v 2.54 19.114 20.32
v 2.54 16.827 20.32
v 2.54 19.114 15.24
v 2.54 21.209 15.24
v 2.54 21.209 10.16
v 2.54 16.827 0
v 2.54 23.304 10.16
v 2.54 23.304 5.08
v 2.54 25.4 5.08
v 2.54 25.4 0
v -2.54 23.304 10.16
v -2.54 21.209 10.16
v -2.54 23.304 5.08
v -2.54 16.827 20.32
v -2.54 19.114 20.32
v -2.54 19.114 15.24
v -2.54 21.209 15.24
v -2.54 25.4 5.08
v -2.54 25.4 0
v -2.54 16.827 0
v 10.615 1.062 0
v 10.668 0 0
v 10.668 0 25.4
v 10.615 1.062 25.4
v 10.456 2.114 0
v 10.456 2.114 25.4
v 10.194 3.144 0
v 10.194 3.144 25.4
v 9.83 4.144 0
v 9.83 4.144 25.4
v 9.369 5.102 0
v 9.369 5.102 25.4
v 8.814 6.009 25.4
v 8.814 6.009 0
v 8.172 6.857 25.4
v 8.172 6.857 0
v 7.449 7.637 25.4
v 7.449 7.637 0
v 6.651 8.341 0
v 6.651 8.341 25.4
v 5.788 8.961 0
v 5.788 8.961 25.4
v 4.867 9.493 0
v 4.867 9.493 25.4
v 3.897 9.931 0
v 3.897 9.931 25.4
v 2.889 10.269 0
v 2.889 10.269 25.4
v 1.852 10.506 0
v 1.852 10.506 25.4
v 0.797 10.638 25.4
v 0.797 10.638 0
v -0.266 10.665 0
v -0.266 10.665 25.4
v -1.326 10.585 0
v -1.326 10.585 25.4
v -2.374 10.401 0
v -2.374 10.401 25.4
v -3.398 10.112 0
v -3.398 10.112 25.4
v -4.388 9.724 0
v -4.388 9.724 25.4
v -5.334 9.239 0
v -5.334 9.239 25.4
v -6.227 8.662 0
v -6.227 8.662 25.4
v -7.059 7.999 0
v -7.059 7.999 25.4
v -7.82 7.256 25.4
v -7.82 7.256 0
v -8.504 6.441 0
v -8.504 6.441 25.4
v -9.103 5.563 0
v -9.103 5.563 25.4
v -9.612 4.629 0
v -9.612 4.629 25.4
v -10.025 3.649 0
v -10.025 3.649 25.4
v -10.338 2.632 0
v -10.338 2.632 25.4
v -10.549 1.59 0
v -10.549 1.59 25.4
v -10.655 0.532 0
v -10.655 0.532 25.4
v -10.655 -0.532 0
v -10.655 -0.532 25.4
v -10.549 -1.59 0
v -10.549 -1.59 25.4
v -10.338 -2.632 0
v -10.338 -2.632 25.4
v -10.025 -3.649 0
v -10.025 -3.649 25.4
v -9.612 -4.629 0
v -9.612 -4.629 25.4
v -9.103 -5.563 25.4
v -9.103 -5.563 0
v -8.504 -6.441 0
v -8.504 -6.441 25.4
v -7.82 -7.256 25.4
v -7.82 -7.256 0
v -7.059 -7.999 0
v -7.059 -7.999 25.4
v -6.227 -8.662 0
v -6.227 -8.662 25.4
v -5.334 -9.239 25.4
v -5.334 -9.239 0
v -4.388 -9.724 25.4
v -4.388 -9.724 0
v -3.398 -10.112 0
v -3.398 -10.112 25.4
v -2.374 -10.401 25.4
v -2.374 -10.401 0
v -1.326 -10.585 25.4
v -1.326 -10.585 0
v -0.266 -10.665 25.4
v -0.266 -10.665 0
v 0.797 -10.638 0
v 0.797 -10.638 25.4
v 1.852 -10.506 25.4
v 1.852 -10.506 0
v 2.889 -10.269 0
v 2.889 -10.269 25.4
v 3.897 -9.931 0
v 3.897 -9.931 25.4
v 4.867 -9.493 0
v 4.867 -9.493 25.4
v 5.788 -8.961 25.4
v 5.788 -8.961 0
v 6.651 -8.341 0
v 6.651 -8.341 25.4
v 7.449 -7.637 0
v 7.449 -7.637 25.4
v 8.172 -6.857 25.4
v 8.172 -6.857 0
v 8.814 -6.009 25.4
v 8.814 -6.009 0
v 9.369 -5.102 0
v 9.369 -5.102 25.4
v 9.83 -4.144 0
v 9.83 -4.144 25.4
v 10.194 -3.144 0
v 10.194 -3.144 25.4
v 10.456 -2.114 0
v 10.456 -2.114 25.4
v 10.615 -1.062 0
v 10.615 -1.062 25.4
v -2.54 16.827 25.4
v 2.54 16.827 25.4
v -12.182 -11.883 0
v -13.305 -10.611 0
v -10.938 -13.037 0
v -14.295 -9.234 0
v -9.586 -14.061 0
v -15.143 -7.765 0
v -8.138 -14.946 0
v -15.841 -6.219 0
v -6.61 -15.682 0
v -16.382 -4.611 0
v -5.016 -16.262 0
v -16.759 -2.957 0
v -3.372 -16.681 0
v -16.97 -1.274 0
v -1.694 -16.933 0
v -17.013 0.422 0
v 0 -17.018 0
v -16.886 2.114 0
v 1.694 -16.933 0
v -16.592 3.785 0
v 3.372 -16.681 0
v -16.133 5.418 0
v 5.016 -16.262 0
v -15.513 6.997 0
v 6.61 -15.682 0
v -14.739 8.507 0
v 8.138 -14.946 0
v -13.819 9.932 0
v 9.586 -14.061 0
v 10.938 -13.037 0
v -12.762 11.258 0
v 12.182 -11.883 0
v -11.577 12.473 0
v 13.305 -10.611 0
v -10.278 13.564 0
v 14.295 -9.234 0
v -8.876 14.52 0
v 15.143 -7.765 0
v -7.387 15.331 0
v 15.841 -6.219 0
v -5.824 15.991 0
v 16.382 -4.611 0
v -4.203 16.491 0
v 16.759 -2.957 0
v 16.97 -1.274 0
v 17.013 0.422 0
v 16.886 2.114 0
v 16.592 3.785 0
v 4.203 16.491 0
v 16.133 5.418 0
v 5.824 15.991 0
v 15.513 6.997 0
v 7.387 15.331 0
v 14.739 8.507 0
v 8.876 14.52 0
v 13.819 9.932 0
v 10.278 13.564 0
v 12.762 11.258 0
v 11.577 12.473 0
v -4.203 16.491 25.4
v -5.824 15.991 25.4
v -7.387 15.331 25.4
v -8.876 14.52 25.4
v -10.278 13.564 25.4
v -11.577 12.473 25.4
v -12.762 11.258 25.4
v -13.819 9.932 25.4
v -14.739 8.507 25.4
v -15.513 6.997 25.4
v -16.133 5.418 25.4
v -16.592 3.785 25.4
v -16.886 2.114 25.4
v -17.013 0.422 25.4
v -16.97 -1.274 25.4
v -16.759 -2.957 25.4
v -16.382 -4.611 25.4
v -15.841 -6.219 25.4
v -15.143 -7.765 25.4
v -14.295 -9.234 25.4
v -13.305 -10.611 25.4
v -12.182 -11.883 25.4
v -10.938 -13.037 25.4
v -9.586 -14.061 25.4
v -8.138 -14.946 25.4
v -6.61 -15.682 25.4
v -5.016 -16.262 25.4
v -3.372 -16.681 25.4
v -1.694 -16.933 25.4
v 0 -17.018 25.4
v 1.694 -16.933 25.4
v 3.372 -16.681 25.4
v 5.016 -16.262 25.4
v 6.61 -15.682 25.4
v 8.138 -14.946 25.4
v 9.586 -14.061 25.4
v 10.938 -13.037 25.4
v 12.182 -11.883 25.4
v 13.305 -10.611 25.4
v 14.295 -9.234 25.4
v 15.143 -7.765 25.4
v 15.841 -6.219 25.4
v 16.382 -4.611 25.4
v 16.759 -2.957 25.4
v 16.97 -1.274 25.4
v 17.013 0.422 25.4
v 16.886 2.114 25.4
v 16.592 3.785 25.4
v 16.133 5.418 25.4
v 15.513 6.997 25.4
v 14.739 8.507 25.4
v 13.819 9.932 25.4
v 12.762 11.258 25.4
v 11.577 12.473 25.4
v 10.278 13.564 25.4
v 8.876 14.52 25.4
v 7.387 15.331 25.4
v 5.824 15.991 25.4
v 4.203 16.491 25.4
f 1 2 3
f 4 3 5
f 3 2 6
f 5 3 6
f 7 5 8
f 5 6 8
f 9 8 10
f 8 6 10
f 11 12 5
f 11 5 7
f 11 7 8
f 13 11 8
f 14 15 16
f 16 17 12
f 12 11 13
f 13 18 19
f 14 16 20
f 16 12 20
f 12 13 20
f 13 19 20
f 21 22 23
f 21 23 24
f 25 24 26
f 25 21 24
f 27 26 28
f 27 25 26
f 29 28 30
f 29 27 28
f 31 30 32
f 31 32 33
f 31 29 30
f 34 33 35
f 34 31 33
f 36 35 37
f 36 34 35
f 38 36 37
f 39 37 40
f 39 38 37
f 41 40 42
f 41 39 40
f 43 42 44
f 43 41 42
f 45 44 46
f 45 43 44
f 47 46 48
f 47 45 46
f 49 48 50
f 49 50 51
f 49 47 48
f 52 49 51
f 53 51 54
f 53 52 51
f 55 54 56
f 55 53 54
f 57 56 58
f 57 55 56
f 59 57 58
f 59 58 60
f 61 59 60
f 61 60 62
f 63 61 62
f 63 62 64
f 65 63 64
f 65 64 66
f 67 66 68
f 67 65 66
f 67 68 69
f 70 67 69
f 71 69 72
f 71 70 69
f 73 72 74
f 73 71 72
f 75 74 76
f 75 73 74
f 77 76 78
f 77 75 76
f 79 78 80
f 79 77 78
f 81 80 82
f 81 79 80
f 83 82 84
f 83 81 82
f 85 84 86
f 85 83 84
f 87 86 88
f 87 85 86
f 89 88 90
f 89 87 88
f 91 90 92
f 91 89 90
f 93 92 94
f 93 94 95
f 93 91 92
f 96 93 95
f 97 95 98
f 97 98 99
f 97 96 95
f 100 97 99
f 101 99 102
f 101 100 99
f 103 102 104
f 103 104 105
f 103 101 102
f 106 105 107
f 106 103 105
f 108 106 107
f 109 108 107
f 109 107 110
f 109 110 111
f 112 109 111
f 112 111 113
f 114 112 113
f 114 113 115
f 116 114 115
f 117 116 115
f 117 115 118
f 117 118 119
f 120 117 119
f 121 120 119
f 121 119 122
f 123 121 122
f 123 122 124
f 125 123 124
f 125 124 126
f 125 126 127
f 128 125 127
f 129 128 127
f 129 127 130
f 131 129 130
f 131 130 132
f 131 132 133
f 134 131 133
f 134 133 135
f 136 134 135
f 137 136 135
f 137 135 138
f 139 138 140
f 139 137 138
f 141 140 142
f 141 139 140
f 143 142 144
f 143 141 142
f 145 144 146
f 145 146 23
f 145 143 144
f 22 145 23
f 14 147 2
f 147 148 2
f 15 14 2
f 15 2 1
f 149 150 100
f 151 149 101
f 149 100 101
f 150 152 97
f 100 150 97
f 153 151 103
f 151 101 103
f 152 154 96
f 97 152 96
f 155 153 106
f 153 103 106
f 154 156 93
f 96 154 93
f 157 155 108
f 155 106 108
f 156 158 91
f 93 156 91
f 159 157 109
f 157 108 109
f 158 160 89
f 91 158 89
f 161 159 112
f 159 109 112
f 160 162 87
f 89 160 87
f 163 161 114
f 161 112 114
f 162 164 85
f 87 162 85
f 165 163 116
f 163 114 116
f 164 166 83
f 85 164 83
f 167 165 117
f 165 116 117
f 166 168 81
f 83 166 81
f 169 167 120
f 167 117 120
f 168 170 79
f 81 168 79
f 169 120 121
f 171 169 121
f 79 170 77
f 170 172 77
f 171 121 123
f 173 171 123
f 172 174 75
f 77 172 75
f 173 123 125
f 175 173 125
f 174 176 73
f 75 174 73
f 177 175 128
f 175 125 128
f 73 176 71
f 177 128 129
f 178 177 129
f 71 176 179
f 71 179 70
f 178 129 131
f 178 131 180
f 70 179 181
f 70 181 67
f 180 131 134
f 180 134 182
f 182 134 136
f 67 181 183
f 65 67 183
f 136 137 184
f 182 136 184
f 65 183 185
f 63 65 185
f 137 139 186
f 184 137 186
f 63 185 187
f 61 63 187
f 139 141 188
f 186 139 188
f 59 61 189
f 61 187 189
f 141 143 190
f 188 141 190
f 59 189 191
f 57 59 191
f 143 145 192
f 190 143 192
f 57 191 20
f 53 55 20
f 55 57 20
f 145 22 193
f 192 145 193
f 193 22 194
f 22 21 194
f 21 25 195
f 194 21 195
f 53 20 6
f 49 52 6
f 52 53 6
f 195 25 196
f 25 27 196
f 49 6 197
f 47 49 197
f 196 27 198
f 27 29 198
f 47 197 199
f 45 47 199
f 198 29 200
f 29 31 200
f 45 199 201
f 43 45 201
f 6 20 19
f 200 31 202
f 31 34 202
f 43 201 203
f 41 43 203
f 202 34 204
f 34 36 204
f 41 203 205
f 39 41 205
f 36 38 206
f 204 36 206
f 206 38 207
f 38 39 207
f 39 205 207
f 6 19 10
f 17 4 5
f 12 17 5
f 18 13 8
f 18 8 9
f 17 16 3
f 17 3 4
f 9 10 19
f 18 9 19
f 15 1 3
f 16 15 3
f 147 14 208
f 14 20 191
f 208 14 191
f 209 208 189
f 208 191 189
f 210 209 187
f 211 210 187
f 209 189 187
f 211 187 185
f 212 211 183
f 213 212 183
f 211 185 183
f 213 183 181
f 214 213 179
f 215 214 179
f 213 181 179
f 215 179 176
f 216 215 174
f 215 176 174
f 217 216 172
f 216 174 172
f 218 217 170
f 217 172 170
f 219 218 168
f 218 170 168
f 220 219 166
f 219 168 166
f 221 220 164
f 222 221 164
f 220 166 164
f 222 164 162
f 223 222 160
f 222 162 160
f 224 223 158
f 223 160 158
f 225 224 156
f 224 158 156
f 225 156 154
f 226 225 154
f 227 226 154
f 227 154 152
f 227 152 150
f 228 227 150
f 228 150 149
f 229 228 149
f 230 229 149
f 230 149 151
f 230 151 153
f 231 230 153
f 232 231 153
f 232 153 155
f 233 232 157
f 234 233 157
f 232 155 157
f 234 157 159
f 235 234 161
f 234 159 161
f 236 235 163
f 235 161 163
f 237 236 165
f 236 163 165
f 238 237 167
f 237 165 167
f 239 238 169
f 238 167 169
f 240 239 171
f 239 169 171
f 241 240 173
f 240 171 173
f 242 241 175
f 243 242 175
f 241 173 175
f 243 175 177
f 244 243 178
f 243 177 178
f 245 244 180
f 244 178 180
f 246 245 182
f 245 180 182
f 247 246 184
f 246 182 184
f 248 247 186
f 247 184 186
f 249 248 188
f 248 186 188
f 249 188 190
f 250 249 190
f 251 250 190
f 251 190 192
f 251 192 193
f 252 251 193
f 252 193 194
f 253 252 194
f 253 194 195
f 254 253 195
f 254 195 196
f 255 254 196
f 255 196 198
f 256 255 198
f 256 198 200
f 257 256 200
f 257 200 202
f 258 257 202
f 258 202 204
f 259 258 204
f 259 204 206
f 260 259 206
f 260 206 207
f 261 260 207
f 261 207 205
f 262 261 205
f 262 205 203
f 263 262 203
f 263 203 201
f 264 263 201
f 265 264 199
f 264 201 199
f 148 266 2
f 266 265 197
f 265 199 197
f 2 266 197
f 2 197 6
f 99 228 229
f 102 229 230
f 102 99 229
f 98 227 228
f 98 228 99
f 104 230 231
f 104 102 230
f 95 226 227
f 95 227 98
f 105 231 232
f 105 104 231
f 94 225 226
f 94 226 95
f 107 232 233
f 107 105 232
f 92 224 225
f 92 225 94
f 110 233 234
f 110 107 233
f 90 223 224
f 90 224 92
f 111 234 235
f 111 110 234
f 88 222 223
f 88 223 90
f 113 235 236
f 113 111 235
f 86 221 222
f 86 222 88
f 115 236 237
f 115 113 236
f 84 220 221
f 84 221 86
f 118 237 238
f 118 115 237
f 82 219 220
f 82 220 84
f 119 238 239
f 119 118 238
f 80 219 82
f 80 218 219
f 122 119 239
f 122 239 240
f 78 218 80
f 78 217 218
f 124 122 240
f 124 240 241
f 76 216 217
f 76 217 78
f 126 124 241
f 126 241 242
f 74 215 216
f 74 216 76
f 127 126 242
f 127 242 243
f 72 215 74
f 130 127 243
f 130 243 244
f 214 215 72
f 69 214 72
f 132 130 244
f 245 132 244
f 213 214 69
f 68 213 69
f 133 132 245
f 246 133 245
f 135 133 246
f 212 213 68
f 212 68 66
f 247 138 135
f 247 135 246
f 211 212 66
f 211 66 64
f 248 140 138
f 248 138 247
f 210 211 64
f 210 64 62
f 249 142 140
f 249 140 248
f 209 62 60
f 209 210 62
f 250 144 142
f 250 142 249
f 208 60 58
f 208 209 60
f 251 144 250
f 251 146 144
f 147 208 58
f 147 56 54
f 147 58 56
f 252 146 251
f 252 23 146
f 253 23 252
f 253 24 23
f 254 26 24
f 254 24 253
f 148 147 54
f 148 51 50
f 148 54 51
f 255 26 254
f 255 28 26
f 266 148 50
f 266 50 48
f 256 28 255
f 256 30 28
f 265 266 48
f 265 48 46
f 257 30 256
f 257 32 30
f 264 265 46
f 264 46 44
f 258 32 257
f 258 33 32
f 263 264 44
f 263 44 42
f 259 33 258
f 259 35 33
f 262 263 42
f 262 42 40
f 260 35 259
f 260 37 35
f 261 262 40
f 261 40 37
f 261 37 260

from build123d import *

# Parameters (mm, degrees)
F0_R     = 10.668
F1_DEPTH = 25.4
F3_DEPTH = 12.7


with BuildPart() as f1:
    # F0 (on Top) → F1 (new body)
    with BuildSketch(Plane.XY):
        with BuildLine():
            Line((-2.54, 25.4), (-2.54, 16.8273801883))
            ThreePointArc((-2.54, 16.8273801883), (0, -17.018), (2.54, 16.8273801883))
            Line((2.54, 16.8273801883), (2.54, 25.4))
            Line((2.54, 25.4), (-2.54, 25.4))
        make_face()
        Circle(F0_R, mode=Mode.SUBTRACT)
    extrude(amount=F1_DEPTH)

    # F2 (on Right) → F3 (cut, symmetric)
    with BuildSketch(Plane.YZ):
        Polygon((23.3045, 5.08), (25.4, 5.08), (25.4, 0), (25.4, -8.07502307), (34.9588990211, -8.07502307), (34.9588990211, 29.4091364962), (16.8273801883, 29.4091364962), (16.8273801883, 20.32), (19.1135, 20.32), (19.1135, 15.24), (21.209, 15.24), (21.209, 10.16), (23.3045, 10.16), align=None)
    extrude(amount=F3_DEPTH, both=True, mode=Mode.SUBTRACT)


solid = f1.part
